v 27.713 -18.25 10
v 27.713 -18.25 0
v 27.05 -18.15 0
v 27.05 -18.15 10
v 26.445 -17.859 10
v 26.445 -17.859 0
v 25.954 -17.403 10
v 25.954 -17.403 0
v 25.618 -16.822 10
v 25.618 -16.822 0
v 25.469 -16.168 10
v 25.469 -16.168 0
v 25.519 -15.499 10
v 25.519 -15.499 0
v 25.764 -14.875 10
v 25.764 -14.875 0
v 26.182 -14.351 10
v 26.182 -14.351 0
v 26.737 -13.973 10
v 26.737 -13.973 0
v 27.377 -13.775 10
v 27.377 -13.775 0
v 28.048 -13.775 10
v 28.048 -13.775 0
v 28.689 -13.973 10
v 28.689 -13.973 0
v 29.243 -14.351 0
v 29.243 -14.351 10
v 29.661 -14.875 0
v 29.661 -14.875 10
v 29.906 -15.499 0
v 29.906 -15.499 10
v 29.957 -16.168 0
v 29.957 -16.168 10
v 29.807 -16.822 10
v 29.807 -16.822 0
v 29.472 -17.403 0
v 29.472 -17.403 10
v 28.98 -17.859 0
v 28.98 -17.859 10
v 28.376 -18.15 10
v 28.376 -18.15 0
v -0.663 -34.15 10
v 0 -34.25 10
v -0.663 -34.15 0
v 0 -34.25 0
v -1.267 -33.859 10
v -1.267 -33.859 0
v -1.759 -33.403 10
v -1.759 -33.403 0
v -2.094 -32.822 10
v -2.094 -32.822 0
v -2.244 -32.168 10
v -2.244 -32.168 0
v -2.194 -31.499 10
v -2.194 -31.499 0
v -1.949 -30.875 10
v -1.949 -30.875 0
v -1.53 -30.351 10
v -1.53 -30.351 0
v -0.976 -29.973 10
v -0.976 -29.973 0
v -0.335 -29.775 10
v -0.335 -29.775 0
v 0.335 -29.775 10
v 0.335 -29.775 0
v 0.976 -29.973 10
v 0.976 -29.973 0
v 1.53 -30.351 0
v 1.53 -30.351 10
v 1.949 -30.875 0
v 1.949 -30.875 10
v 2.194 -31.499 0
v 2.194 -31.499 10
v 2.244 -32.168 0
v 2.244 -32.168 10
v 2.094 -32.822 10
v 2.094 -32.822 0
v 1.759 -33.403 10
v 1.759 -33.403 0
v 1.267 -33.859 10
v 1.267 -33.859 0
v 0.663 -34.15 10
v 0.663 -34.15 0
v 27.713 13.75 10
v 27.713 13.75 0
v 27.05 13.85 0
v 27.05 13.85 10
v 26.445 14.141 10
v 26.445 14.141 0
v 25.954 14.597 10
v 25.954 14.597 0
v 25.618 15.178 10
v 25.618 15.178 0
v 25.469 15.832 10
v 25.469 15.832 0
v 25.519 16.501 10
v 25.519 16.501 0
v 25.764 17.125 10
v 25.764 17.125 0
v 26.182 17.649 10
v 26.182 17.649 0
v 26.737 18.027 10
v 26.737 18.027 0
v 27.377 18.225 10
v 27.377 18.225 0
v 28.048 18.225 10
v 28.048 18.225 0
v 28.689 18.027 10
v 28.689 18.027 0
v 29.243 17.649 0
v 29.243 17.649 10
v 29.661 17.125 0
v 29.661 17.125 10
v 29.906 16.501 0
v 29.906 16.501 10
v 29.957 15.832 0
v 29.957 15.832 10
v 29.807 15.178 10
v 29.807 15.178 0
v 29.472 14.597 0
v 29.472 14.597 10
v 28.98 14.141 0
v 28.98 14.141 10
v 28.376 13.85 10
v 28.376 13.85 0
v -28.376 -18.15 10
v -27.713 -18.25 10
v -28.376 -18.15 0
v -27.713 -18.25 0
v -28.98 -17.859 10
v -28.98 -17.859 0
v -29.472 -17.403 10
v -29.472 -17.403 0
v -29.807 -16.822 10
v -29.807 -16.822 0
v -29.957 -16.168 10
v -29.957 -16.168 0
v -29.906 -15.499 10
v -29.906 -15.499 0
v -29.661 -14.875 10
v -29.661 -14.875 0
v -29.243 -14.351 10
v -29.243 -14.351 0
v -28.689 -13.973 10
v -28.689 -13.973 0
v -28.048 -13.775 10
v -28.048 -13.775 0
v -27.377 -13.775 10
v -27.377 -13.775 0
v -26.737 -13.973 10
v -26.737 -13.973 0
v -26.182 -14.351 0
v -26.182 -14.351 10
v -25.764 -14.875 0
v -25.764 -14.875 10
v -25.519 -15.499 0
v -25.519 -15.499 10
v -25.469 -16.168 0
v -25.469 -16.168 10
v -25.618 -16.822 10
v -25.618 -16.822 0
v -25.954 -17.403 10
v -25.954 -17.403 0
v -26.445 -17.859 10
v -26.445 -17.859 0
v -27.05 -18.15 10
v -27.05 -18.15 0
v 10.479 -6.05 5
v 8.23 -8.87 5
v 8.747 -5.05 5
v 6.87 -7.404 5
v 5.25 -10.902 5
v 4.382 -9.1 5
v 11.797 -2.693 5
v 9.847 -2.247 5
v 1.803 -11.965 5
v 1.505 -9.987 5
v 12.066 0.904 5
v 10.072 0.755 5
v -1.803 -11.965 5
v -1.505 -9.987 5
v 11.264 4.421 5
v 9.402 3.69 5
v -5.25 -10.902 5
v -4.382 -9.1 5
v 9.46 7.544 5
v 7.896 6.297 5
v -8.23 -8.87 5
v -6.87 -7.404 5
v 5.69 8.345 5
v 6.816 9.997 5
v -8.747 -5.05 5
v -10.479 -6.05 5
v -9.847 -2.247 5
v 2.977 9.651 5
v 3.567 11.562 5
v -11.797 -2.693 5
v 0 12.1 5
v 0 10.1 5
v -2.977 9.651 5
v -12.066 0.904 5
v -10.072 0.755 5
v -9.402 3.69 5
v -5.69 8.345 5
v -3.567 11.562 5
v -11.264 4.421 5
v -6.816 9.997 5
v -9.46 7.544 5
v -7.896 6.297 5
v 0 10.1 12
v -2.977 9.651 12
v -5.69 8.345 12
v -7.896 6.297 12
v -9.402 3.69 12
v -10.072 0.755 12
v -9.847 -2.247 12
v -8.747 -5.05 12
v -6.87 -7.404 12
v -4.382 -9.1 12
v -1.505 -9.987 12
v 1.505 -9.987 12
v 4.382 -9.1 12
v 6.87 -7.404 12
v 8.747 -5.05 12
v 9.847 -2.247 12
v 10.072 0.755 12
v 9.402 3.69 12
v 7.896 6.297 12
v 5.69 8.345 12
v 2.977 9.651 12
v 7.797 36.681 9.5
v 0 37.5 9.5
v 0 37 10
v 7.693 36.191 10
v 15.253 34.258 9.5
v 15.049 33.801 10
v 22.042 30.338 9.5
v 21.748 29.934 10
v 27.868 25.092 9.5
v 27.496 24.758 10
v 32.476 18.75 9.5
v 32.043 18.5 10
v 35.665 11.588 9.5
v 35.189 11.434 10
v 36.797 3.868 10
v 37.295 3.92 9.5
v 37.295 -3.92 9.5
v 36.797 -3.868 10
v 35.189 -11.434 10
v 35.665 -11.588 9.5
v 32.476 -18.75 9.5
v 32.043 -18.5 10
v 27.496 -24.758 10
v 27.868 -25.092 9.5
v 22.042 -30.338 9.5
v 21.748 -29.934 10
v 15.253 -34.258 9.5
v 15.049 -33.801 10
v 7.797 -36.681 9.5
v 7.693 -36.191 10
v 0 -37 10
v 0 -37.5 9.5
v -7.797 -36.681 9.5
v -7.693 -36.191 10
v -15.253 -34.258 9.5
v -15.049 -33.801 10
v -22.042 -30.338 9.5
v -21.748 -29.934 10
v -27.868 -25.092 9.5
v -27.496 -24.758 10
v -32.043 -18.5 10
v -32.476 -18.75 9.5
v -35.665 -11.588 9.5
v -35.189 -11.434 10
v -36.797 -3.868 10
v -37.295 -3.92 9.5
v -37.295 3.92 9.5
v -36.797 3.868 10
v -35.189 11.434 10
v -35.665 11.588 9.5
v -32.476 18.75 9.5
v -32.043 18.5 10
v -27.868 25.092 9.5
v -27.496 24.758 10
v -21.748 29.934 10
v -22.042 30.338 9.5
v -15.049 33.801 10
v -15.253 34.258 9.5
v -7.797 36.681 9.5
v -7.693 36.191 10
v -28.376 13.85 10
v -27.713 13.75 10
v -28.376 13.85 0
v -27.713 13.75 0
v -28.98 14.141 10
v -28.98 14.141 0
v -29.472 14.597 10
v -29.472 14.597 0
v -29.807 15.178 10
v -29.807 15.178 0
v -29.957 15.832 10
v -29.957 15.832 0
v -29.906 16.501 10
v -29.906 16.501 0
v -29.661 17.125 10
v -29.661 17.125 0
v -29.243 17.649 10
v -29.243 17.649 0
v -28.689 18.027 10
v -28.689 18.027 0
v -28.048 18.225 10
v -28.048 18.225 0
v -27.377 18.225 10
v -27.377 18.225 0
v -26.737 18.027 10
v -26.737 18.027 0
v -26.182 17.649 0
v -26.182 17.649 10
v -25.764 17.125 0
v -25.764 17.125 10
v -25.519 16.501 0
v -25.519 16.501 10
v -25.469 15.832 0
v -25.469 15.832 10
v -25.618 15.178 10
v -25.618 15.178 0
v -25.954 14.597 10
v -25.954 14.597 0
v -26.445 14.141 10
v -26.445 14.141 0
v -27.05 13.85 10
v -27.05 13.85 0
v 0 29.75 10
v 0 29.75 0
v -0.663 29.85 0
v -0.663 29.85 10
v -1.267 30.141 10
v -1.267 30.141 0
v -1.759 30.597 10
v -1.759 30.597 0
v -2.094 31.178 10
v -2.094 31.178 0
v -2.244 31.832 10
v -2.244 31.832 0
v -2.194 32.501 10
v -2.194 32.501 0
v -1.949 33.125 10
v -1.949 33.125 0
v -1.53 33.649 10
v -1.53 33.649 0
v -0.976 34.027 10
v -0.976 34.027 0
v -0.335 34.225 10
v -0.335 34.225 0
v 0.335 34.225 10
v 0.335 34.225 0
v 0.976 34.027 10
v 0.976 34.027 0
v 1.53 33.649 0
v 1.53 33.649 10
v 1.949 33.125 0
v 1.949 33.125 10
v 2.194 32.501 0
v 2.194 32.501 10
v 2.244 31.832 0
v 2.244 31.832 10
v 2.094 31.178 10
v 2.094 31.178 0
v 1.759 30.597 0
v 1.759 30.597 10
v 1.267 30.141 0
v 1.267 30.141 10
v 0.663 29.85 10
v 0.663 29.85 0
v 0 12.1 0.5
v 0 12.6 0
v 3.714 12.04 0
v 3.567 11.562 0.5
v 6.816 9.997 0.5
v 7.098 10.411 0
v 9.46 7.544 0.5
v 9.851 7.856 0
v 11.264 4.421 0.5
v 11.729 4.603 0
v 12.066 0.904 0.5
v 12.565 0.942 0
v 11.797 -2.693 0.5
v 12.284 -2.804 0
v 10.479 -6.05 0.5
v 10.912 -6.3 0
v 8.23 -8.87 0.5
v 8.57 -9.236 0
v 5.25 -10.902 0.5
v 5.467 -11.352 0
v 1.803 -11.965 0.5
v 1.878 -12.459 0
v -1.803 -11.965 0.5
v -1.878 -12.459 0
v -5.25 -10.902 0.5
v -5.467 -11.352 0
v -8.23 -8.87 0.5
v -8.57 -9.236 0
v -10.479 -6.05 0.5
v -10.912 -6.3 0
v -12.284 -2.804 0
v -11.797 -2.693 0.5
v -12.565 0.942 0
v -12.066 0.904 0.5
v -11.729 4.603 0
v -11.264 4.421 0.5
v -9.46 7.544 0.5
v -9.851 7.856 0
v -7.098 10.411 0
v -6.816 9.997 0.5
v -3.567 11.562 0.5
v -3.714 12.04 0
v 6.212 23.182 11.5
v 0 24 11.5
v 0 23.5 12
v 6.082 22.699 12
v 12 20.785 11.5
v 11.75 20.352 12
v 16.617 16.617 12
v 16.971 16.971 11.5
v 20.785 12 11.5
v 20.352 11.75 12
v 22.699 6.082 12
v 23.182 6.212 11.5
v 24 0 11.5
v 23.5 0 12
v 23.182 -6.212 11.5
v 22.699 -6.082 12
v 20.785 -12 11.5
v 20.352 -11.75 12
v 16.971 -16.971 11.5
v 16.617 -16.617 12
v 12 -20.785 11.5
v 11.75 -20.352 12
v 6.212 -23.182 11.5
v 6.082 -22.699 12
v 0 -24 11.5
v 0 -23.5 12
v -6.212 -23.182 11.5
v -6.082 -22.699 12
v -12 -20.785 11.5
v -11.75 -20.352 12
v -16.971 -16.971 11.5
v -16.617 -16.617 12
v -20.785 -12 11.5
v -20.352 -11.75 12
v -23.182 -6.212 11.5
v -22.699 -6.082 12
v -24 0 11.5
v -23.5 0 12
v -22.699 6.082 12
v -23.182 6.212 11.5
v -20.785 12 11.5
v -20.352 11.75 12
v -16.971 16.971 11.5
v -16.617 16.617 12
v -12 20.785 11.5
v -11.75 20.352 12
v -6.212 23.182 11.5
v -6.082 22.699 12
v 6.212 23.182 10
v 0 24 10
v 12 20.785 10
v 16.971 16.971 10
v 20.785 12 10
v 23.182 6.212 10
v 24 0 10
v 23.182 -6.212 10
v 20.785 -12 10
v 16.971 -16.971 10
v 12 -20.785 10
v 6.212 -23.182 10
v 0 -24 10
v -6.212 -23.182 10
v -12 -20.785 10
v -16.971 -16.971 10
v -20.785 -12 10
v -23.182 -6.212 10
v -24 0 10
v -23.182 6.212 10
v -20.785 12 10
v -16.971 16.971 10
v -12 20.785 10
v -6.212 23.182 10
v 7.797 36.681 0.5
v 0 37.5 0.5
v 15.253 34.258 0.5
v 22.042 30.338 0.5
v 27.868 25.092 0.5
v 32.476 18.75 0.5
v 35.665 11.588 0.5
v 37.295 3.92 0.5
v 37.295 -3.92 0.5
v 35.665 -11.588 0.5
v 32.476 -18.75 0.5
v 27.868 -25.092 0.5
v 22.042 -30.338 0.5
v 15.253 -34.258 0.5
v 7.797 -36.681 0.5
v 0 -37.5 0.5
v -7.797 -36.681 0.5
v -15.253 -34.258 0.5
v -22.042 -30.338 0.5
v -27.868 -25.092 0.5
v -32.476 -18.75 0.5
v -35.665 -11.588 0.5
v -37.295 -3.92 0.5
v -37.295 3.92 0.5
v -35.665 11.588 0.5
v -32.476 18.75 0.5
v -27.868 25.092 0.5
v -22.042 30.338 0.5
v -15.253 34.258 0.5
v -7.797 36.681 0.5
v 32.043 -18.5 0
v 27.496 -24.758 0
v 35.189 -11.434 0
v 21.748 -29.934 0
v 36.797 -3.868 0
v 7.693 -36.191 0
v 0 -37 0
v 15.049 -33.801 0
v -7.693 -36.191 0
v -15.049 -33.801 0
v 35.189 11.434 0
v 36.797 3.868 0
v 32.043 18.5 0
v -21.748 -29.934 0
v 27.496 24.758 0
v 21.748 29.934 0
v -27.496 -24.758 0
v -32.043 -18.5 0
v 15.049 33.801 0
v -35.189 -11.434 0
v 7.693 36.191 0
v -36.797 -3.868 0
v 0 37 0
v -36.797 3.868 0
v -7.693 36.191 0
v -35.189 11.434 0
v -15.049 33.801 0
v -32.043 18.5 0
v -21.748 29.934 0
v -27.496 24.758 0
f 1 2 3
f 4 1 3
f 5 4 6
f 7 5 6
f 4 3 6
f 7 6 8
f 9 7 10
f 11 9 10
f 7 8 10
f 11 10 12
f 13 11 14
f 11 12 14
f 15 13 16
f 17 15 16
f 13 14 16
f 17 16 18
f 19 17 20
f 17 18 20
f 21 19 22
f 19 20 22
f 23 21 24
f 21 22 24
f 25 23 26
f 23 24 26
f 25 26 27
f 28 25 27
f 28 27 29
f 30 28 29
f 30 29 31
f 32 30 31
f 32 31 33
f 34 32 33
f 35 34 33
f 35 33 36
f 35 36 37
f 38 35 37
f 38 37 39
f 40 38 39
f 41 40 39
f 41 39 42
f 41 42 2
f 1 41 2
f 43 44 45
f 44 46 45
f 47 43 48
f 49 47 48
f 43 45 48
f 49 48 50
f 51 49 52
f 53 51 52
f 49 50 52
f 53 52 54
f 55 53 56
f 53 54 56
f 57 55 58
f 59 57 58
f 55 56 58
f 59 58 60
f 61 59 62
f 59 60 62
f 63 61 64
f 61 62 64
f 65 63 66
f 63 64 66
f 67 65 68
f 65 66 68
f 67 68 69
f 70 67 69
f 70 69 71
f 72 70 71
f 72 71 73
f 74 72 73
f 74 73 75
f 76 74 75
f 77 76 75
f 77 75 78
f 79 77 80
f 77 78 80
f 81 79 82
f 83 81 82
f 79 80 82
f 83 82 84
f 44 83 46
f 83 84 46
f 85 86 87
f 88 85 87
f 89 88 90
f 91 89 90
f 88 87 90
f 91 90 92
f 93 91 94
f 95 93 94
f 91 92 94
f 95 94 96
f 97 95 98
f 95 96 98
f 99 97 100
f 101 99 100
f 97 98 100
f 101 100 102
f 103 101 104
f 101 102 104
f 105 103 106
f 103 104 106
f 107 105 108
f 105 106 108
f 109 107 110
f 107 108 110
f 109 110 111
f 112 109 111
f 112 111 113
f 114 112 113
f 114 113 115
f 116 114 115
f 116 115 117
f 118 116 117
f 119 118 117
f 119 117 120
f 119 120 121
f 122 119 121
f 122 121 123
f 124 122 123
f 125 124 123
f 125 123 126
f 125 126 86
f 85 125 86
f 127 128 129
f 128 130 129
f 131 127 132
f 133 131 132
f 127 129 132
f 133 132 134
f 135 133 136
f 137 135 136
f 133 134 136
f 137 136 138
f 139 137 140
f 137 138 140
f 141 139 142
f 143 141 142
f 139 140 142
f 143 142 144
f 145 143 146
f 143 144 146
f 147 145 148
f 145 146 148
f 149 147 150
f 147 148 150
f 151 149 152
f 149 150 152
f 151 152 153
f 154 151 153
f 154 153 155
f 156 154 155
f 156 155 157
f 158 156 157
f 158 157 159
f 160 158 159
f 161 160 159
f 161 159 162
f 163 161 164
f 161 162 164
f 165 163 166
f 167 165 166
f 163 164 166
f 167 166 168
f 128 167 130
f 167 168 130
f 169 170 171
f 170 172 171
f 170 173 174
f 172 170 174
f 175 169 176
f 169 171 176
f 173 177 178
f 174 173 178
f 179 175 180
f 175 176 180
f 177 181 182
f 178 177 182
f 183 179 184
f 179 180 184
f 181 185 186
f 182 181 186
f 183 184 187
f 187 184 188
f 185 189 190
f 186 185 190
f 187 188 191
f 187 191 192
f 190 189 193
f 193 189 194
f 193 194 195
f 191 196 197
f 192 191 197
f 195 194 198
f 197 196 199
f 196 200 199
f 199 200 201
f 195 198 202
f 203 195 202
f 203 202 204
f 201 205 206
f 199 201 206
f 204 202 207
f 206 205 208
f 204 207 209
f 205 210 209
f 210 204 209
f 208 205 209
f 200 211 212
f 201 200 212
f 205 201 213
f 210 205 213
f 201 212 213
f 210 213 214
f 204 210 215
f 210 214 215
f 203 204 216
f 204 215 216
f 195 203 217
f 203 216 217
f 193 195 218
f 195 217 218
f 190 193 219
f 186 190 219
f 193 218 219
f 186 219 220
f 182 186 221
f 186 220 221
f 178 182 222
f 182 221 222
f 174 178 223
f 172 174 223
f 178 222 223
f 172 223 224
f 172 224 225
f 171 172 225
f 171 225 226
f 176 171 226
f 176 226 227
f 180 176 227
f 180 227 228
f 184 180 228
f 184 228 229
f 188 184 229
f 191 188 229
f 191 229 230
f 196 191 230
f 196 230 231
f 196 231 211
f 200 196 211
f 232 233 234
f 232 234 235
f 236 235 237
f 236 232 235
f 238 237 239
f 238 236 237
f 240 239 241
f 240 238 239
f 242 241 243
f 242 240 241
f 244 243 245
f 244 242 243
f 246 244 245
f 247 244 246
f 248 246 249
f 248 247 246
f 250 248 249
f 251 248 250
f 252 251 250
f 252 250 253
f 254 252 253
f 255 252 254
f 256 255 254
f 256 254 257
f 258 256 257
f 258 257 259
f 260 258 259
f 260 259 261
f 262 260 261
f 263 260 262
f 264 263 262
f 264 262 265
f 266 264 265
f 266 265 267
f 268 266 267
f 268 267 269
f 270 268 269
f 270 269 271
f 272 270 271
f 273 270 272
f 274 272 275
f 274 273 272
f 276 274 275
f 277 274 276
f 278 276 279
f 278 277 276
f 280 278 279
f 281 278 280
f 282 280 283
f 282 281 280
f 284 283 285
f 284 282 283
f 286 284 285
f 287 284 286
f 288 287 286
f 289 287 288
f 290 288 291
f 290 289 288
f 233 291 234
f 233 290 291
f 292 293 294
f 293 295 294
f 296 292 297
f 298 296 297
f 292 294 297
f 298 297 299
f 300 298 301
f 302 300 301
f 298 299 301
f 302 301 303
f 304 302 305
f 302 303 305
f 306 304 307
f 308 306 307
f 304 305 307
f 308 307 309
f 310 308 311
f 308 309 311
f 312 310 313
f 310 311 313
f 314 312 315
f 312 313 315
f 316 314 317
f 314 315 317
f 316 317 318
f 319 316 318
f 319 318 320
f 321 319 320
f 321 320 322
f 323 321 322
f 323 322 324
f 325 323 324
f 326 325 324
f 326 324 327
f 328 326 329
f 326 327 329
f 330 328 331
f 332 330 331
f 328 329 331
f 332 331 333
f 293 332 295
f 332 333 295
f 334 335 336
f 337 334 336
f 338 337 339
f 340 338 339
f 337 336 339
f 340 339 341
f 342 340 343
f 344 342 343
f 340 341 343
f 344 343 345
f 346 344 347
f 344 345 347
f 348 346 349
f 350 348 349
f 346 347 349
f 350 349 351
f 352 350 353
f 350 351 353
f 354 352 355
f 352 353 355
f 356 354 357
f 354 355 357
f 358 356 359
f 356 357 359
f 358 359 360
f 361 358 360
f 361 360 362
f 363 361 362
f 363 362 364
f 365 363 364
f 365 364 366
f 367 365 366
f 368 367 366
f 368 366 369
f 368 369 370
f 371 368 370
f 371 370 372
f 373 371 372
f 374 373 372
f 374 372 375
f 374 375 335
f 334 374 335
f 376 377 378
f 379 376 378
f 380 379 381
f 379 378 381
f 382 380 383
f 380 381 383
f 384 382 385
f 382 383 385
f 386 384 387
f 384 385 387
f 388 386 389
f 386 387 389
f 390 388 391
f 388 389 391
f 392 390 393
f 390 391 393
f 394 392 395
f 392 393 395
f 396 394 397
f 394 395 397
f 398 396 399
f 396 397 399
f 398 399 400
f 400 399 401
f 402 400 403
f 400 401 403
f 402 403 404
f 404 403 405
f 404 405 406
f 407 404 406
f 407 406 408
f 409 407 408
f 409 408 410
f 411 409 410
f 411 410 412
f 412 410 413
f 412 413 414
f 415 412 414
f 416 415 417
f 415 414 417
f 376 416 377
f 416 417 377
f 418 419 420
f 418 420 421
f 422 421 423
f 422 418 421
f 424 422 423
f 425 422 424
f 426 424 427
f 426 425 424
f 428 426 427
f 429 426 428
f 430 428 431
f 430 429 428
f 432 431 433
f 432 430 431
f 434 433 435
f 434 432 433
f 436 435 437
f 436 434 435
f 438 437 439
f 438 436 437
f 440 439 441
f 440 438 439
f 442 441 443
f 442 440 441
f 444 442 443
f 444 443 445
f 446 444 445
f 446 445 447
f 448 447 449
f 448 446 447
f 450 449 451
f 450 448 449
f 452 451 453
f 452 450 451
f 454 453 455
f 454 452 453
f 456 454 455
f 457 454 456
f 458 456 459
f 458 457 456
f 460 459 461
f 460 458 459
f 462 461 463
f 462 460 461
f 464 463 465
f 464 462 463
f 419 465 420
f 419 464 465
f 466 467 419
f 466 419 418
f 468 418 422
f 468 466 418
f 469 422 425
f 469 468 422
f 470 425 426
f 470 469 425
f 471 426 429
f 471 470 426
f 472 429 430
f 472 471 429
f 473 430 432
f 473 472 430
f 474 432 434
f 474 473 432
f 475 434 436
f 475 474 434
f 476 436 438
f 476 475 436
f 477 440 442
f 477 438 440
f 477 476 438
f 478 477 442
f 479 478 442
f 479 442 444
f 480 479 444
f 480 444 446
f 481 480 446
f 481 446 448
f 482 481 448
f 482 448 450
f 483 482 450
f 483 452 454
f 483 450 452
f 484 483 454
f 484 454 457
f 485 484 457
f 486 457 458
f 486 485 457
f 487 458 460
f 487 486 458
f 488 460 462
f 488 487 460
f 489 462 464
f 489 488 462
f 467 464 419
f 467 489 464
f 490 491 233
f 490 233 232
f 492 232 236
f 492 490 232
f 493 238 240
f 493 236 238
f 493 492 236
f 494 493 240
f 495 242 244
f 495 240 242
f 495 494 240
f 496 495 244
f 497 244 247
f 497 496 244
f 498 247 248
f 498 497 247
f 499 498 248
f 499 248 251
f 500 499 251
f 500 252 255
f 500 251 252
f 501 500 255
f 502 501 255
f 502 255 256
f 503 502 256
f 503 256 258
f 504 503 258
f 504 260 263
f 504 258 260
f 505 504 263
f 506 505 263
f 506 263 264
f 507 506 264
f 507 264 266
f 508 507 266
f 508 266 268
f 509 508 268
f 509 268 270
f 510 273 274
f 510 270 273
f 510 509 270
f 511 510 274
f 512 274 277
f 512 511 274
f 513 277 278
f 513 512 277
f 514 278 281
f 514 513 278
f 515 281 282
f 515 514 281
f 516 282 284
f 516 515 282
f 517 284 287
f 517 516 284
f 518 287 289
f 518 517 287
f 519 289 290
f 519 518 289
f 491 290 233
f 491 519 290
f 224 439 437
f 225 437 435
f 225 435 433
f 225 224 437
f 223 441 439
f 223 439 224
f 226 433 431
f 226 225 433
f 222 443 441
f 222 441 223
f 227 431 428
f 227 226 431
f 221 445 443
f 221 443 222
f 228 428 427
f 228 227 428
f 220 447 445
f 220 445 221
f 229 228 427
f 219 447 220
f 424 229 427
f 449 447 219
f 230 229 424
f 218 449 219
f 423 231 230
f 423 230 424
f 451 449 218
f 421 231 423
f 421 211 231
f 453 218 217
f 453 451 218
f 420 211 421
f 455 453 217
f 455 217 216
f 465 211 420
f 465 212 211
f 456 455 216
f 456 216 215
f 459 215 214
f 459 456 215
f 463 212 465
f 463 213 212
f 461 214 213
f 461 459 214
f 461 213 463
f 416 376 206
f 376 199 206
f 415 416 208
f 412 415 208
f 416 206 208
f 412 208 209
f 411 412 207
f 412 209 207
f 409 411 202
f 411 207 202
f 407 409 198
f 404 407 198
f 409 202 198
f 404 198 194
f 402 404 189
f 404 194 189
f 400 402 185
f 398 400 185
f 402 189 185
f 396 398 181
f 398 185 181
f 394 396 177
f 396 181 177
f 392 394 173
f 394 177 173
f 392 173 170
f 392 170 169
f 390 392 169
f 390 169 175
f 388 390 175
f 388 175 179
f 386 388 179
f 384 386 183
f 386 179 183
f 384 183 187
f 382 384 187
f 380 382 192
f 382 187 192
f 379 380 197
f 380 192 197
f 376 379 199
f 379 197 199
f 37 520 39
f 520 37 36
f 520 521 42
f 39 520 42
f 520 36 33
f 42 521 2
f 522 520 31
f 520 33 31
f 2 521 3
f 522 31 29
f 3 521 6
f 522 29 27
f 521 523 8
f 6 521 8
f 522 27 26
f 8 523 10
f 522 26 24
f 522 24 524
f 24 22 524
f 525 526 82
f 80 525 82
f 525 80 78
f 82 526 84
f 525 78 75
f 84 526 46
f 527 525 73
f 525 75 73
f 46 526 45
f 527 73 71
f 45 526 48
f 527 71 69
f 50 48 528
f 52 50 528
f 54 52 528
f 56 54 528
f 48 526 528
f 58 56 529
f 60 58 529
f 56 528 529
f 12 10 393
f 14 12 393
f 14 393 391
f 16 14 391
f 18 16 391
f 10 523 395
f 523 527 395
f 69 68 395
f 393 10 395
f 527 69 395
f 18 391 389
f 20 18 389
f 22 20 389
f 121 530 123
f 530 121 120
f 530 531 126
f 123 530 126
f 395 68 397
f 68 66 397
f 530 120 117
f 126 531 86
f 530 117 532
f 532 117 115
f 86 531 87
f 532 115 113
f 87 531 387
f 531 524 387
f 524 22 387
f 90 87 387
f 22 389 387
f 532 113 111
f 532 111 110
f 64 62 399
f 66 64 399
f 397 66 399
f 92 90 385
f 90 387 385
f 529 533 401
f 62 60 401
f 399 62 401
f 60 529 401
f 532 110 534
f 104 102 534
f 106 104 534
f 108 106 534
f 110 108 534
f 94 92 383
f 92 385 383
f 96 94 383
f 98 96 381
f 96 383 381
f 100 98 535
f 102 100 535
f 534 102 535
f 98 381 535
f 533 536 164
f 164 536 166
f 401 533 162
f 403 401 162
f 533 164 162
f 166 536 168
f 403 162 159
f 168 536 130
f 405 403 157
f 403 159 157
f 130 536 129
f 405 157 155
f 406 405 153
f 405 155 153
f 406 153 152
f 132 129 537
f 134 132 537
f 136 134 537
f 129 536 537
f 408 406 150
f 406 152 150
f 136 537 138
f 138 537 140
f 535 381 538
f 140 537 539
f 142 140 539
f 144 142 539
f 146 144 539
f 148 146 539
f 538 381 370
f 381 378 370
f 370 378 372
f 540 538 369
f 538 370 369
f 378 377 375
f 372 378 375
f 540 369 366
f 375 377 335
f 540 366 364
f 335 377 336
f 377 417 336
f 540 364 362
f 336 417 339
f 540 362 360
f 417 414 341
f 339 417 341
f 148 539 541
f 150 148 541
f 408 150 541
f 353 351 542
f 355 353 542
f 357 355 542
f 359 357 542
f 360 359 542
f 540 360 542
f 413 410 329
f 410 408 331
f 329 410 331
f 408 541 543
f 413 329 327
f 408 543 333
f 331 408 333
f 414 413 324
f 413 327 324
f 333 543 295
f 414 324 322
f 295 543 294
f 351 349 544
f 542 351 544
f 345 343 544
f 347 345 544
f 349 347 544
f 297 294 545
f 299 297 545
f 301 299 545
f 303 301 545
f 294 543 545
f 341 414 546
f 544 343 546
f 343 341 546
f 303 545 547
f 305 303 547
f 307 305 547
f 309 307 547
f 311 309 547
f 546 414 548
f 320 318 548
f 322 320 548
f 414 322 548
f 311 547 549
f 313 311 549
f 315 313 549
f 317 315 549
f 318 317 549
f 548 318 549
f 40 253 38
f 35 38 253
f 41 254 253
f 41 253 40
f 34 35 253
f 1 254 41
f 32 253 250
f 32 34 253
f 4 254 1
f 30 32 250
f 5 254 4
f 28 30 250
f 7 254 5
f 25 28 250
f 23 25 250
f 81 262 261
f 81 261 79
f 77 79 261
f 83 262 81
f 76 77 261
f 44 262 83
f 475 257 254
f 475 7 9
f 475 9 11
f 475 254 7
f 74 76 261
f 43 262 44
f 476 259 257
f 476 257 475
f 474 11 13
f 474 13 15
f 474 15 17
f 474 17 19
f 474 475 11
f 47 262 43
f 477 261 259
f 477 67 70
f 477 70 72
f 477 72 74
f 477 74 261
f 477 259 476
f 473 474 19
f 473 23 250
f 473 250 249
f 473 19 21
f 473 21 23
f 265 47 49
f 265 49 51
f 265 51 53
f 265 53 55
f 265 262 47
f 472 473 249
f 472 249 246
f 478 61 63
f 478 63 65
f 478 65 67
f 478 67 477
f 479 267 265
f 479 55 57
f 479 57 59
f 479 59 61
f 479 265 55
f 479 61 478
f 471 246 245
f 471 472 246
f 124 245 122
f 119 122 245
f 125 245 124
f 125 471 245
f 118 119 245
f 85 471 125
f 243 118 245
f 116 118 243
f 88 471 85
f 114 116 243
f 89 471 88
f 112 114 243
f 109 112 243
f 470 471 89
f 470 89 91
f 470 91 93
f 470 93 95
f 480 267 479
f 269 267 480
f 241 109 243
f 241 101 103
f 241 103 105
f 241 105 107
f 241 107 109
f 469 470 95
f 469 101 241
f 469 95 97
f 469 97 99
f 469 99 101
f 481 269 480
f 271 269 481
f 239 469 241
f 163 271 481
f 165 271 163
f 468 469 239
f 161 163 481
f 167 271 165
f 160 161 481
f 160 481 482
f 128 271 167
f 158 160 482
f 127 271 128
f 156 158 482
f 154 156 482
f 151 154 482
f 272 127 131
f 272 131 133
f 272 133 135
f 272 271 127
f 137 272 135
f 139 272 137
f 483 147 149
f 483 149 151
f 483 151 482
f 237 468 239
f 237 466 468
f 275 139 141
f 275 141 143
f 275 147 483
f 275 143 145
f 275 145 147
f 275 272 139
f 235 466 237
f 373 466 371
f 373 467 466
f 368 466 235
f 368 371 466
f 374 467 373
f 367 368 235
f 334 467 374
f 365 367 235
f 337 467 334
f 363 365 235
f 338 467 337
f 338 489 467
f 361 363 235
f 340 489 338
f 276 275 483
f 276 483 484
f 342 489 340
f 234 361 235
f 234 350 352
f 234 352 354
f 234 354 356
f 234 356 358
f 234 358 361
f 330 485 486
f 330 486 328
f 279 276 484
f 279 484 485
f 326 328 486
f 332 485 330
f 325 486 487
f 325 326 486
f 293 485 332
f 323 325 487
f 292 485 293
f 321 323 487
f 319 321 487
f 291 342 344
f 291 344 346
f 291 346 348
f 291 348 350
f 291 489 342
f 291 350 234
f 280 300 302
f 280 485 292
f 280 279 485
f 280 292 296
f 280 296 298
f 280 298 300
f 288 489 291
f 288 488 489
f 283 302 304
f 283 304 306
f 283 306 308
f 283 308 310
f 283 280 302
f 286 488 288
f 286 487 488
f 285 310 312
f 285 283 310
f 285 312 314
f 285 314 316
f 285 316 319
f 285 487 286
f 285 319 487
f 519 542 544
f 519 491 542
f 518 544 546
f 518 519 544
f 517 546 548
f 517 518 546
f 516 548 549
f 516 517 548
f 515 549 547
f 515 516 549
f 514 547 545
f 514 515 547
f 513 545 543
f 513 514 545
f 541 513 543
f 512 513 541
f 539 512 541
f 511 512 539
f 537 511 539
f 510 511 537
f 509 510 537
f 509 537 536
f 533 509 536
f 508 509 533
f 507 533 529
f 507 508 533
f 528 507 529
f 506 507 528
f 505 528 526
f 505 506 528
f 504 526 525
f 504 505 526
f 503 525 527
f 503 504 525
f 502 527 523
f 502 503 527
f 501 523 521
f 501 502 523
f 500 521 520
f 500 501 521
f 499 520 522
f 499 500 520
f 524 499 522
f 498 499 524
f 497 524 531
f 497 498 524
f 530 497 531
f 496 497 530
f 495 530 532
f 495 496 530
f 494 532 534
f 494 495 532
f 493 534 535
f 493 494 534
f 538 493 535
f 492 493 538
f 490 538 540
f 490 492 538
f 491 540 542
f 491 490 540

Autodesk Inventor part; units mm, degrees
ref_plane "YZ Plane" through (0, 0, 0) normal (1, 0, 0) x (0, 1, 0)
ref_plane "XZ Plane" through (0, 0, 0) normal (0, 1, 0) x (-1, 0, 0)
ref_plane "XY Plane" through (0, 0, 0) normal (0, 0, 1) x (1, 0, 0)
sketch "スケッチ1" plane through (0, 0, 0) normal (1, 0, 0) x (0, 1, 0)
  line L0 (12.1, 0) -> (12.1, 5)
  line L1 (12.1, 5) -> (10.1, 5)
  line L2 (10.1, 5) -> (10.1, 10)
  line L3 (37.5, 10) -> (37.5, 0)
  line L4 (37.5, 0) -> (12.1, 0)
  line L5 (0, -2.4) -> (0, 14.4) projected
  line L6 (10.1, 10) -> (10.1, 10)
  line L7 (10.1, 10) -> (10.1, 12)
  line L8 (10.1, 12) -> (24, 12)
  line L9 (24, 12) -> (24, 10)
  line L10 (24, 10) -> (37.5, 10)
  point P0 (0, 0)
  dimension "d0" = 12.1
  dimension "d1" = 37.5
  dimension "d2" = 2
  dimension "d3" = 5
  dimension "d5" = 10
  dimension "d31" = 24
  dimension "d32" = 2
  dimension "d34" = 0
revolve "回転1" add sketch "スケッチ1" angle 360 about axis through (0, 0, -10) along (0, 0, 1)
chamfer "面取り1" distance 0.5 angle 45 1 edges at (0, -12.1, 0)
sketch "スケッチ2" plane through (0, 0, 10) normal (0, 0, 1) x (1, 0, 0)
  circle A0 centre (0, 0) radius 32
  point P0 (0, 32)
  point P1 (-27.7128, 16)
  point P2 (-27.7128, -16)
  point P3 (0, -32)
  point P4 (27.7128, -16)
  point P5 (27.7128, 16)
  dimension "d10" = 64
  dimension "d13" = 360
hole "穴1" at (0, 32, 10) at (-27.7128, 16, 10) at (-27.7128, -16, 10) at (0, -32, 10) at (27.7128, -16, 10) at (27.7128, 16, 10) direction (0, 0, -1) diameter 4.5 end through all clearance for "Flat Head Machine Screw" size "M4" standard "Ansi Metric M Profile"
chamfer "面取り2" distance 0.5 angle 45 2 edges at (0, -37.5, 0) (0, -37.5, 10)
chamfer "面取り3" distance 0.5 angle 45 1 edges at (0, -24, 12)
properties part number "unit-j2-base3" material "ABS プラスチック"
